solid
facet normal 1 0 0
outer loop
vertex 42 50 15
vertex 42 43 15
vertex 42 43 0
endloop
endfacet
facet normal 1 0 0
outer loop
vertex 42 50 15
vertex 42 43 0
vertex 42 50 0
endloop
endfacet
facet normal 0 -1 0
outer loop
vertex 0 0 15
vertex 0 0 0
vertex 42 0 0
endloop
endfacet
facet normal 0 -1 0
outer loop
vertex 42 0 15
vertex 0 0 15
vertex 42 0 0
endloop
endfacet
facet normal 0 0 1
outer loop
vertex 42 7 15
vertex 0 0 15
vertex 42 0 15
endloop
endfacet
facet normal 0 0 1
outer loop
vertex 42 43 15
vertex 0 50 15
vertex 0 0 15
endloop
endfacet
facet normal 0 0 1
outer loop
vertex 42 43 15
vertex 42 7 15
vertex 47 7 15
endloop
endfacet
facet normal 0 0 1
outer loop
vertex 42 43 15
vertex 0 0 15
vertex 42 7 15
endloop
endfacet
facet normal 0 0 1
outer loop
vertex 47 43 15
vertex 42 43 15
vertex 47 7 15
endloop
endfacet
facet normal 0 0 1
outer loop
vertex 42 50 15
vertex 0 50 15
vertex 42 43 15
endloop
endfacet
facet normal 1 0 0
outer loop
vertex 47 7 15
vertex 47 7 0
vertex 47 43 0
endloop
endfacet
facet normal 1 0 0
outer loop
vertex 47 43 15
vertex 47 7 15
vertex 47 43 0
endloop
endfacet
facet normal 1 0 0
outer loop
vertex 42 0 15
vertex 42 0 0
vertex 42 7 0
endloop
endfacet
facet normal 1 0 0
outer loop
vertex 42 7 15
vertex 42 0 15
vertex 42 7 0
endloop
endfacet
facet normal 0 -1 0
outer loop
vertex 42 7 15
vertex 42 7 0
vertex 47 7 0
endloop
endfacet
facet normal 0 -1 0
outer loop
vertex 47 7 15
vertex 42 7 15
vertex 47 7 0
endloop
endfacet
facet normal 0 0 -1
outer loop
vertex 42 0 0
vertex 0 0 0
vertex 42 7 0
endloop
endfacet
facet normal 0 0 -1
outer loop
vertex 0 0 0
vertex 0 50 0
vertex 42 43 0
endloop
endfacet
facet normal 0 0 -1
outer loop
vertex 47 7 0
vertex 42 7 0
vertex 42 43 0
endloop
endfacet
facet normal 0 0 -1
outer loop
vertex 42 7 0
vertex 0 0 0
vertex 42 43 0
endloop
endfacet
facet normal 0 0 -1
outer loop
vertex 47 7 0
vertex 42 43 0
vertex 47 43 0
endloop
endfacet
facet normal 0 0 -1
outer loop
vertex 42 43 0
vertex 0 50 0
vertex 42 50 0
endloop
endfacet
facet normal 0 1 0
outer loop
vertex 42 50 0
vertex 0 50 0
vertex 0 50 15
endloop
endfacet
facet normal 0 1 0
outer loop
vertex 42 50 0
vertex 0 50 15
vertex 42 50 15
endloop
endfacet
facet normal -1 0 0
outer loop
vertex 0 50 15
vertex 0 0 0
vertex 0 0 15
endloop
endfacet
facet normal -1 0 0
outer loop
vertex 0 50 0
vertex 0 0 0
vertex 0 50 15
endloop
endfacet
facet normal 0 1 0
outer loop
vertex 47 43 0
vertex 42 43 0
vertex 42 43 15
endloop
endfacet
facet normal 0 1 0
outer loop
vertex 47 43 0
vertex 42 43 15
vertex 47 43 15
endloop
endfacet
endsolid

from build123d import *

# Parameters (mm, degrees)
BOX007_W     = 42
BOX007_H     = 50
BOX007_DEPTH = 15
BOX008_W     = 5
BOX008_H     = 36
BOX008_DEPTH = 15


with BuildPart() as cube006:
    # Box007 → Box007 (new body)
    with BuildSketch(Plane.XY):
        with Locations((21, 25)):
            Rectangle(BOX007_W, BOX007_H)
    extrude(amount=BOX007_DEPTH)


with BuildPart() as usb_fusion:
    # Box008 → Box008 (new body)
    with BuildSketch(Plane(origin=(42, 7, 0), x_dir=(1, 0, 0), z_dir=(0, 0, 1))):
        with Locations((2.5, 18)):
            Rectangle(BOX008_W, BOX008_H)
    extrude(amount=BOX008_DEPTH)

    # Fusion001: union Cube006
    add(cube006.part)


solid = usb_fusion.part
